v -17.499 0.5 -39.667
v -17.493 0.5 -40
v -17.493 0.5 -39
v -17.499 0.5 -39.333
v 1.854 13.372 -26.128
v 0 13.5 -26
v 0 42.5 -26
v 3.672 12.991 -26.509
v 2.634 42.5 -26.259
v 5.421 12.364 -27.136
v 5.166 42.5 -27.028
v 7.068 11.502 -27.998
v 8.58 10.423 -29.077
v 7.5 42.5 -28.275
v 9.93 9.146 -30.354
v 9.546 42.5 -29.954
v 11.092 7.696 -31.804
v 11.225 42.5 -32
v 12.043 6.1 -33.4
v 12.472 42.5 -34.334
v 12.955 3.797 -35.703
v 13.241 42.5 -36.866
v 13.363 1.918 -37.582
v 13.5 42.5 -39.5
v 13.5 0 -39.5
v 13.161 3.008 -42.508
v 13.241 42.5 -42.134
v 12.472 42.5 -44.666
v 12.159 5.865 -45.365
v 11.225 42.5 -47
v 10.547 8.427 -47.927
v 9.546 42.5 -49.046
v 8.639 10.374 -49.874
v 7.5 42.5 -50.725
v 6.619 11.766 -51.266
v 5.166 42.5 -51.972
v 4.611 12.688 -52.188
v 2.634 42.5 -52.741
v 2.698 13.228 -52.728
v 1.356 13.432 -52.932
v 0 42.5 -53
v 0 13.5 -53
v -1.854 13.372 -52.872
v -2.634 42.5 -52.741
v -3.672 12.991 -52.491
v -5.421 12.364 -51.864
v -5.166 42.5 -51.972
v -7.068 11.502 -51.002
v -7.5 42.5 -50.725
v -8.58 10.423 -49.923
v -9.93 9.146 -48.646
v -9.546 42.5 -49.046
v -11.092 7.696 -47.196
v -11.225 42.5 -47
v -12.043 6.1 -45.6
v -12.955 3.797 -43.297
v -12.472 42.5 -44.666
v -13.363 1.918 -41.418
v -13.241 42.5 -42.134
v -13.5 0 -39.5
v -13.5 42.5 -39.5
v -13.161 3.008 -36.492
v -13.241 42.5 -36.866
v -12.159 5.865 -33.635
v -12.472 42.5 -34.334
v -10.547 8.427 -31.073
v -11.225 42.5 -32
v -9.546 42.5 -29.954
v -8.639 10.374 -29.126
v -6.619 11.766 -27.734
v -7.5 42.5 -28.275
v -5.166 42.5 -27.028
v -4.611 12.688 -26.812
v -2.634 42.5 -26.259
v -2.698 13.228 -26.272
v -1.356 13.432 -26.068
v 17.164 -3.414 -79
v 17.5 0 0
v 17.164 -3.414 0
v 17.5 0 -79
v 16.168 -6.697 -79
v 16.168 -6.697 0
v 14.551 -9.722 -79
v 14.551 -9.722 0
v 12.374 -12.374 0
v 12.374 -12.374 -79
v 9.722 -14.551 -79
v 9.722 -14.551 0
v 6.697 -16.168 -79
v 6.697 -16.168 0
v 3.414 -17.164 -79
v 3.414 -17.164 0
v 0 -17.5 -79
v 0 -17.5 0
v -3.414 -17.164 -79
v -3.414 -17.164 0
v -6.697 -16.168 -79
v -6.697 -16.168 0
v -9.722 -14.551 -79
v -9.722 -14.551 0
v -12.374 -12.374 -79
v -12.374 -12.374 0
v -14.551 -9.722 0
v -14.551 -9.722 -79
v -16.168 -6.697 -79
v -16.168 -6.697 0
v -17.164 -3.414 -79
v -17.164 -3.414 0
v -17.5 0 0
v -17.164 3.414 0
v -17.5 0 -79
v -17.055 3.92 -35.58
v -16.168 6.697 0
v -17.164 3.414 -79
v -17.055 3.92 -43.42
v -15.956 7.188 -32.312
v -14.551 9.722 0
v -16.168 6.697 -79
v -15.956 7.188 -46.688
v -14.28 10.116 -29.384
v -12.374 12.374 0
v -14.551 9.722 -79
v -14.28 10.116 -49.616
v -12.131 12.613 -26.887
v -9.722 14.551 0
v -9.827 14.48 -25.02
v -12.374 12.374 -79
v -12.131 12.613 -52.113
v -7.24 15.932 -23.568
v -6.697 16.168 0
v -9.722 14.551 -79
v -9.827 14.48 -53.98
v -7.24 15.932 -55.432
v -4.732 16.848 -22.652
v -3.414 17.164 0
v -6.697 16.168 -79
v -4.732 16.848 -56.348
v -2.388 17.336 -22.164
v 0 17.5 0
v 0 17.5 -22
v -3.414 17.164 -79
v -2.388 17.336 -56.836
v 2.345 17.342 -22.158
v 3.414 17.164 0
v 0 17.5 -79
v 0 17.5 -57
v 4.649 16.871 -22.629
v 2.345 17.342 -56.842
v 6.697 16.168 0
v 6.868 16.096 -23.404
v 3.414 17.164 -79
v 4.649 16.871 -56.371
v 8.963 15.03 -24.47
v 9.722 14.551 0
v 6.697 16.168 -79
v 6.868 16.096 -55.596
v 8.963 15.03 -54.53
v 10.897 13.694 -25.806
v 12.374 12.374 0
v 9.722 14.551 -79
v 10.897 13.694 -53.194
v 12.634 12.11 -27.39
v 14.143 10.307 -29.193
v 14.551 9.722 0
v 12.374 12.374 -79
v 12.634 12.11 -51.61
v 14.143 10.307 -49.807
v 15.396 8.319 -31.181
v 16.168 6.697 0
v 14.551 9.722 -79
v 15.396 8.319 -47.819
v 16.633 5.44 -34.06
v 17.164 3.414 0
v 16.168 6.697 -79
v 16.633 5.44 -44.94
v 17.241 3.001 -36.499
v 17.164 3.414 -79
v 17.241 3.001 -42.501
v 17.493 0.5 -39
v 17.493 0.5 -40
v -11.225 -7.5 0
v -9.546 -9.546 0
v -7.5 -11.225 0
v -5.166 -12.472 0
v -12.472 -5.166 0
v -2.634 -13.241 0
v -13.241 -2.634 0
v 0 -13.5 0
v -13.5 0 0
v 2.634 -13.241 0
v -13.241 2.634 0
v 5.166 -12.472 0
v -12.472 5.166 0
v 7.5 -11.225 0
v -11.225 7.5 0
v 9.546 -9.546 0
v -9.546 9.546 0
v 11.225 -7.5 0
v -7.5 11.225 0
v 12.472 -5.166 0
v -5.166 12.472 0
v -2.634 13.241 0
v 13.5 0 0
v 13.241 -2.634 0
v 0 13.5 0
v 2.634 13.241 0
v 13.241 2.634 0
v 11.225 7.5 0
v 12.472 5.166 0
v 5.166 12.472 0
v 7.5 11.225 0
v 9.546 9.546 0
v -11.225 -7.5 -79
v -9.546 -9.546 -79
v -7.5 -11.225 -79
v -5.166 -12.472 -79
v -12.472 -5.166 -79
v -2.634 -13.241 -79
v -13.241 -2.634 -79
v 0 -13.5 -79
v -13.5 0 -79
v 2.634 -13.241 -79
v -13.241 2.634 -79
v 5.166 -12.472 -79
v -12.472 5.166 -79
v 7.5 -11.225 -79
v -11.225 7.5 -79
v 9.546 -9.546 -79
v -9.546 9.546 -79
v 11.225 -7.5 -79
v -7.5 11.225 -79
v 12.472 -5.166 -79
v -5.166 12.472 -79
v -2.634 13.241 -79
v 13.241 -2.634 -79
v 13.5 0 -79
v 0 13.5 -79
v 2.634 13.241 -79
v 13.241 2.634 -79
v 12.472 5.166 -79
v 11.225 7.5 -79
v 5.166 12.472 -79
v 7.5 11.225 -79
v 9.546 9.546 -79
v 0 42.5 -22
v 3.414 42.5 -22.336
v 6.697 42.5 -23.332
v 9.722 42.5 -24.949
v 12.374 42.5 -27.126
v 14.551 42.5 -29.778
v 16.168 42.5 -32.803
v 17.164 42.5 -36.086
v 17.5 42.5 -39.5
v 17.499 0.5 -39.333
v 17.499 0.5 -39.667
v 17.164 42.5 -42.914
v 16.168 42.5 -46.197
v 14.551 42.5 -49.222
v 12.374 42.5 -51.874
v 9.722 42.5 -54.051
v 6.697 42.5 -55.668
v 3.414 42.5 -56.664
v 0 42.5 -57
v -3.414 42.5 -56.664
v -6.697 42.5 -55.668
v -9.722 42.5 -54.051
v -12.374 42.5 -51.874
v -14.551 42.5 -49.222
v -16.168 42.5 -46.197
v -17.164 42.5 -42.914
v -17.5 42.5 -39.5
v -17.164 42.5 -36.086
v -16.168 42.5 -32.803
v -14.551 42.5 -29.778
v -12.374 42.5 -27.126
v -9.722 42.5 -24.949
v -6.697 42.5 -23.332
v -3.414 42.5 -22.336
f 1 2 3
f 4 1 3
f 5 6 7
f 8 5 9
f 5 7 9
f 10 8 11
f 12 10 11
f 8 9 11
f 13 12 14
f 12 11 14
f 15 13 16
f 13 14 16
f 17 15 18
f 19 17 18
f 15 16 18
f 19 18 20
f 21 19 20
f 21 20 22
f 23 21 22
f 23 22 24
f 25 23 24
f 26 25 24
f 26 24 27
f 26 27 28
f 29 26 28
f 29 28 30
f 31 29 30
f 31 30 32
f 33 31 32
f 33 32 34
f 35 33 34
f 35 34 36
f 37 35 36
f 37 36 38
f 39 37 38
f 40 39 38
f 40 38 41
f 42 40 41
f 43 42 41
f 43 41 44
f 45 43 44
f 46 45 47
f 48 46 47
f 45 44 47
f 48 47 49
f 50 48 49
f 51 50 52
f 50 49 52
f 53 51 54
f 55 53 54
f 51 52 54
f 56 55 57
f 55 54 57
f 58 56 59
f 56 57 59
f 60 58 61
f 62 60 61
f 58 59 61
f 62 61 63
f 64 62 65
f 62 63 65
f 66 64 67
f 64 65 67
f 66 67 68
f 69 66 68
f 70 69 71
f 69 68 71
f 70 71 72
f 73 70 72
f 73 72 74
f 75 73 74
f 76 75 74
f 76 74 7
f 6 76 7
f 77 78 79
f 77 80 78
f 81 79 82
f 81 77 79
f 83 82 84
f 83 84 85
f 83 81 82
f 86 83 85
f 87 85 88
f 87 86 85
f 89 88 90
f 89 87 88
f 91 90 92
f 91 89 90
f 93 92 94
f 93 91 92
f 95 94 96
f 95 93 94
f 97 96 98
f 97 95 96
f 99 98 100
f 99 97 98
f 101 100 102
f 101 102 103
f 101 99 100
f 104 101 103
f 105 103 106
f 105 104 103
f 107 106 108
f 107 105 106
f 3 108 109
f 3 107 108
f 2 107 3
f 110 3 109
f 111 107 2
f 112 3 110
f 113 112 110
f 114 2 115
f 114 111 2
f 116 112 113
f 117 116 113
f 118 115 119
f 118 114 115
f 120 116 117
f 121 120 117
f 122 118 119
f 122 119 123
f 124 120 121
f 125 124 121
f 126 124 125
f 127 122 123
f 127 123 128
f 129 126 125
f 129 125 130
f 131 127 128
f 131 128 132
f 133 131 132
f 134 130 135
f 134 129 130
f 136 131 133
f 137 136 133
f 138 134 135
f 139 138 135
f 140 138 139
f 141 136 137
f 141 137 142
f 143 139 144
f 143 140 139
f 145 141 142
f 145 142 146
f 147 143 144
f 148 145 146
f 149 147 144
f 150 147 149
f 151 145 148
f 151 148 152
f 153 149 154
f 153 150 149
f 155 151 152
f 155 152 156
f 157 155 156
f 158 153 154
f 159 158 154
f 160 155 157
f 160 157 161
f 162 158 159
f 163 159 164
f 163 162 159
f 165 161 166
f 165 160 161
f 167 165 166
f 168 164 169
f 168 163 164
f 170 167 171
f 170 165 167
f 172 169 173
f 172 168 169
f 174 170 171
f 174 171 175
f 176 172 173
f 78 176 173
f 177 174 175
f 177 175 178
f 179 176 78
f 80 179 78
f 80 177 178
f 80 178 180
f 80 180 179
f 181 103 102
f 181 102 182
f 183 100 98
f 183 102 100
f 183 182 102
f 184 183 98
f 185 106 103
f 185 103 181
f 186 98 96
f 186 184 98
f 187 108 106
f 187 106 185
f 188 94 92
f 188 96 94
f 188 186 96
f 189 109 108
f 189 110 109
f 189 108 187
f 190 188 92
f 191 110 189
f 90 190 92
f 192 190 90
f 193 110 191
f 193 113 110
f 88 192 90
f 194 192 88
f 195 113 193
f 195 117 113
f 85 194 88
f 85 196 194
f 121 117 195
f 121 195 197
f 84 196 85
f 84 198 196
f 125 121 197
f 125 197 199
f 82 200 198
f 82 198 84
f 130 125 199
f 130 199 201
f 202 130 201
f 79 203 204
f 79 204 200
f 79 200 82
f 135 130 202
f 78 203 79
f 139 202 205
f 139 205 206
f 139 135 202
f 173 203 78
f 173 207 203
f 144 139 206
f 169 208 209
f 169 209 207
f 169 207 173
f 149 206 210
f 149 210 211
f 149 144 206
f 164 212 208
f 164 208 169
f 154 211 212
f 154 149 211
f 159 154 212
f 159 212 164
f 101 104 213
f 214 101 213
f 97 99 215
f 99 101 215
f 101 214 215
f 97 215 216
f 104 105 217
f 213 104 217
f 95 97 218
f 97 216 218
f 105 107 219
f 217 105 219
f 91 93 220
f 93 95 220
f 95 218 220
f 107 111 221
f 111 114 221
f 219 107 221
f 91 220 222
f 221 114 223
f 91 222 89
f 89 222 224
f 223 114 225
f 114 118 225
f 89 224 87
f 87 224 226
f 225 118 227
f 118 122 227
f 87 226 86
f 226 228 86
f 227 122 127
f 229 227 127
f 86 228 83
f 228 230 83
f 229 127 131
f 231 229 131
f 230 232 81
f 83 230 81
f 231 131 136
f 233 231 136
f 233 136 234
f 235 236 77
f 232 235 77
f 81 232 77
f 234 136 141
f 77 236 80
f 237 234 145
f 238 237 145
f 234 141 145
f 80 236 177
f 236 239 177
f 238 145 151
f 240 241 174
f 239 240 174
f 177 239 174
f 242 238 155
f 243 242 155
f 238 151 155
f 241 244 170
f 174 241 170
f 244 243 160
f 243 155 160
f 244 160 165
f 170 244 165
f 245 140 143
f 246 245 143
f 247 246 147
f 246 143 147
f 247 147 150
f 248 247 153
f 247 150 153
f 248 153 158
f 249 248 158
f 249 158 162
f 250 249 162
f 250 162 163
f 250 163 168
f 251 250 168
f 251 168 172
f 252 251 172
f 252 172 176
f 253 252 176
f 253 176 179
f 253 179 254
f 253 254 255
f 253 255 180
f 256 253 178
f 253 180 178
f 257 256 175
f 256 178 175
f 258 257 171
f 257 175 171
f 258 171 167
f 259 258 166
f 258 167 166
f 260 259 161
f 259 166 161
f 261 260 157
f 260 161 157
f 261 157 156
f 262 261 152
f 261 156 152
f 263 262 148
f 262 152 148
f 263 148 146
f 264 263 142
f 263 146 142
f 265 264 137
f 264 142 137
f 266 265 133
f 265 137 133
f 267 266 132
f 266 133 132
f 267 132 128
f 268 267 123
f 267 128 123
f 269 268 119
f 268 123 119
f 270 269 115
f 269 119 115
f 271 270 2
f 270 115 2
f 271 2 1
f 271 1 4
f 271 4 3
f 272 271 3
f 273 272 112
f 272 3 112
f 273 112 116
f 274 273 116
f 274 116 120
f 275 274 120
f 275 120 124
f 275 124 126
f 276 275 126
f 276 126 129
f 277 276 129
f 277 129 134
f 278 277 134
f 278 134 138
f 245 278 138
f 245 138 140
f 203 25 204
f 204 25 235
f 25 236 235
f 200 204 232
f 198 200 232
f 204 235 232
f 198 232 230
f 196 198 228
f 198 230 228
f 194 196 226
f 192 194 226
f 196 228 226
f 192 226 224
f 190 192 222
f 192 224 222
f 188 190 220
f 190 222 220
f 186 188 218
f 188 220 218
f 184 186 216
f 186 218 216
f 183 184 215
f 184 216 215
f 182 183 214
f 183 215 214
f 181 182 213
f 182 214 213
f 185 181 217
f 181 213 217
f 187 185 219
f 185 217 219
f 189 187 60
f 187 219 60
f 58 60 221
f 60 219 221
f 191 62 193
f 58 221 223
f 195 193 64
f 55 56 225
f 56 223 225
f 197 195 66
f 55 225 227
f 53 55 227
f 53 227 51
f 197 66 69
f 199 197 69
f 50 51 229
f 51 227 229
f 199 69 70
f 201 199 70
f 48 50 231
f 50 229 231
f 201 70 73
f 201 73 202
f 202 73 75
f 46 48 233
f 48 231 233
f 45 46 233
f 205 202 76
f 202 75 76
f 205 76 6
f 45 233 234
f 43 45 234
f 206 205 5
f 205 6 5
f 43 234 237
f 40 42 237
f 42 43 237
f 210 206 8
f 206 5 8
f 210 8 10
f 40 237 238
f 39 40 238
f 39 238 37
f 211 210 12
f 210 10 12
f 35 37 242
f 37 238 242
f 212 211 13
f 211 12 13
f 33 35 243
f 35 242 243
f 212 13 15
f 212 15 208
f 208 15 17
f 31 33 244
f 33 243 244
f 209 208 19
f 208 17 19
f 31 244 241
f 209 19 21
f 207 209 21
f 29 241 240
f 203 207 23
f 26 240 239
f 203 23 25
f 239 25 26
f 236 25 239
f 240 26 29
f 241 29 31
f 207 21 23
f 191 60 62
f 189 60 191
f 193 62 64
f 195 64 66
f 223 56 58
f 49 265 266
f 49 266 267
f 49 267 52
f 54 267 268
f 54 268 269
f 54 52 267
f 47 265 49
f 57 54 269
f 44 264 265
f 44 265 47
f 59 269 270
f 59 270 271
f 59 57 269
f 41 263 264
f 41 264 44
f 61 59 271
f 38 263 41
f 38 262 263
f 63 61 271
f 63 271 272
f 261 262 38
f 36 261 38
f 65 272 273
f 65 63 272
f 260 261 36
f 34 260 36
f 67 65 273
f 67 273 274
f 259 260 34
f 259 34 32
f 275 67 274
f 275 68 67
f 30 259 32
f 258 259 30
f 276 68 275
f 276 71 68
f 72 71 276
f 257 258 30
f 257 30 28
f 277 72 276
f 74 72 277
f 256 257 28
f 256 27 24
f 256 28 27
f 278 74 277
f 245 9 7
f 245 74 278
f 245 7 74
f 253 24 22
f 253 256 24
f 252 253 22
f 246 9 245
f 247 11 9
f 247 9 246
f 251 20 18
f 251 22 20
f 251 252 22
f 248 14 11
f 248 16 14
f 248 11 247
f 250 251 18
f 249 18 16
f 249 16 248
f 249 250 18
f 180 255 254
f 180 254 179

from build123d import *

# Parameters (mm, degrees)
SKETCH1_R                = 17.5
SKETCH1_R_2              = 13.5
BOSS_EXTRUDE2_DEPTH      = 25
BOSS_EXTRUDE2_DEPTH_BACK = 17
SKETCH2_R                = 17.5
SKETCH3_R                = 13.5
CUT_EXTRUDE1_DEPTH       = 92.39748364
CUT_EXTRUDE2_REACH       = 102.734
CUT_EXTRUDE2_END_RADIUS  = 13.5
SKETCH4_R                = 13.5


with BuildPart() as part:
    # Sweep1: sweep along a curve in space
    with BuildLine() as sweep1_path:
        Line((0, 0, 0), (0, 0, -79))
    # Sketch1 → Sweep1 (sweep)
    with BuildSketch(Plane.XY):
        Circle(SKETCH1_R)
        Circle(SKETCH1_R_2, mode=Mode.SUBTRACT)
    sweep(path=sweep1_path.line)

    # Sketch2 → Boss-Extrude2 (add, two sides: drawn at the far end of the back side and taken through both)
    with BuildSketch(Plane(origin=(0, 17.5, 0), x_dir=(1, 0, 0), z_dir=(0, 1, 0)).offset(-BOSS_EXTRUDE2_DEPTH_BACK)):
        with Locations(Location((0, 39.5, 0), (0, 0, 270))):
            Circle(SKETCH2_R)
    extrude(amount=BOSS_EXTRUDE2_DEPTH + BOSS_EXTRUDE2_DEPTH_BACK)

    # Sketch3 → Cut-Extrude1 (cut, through all)
    with BuildSketch(Plane.XY):
        Circle(SKETCH3_R)
    extrude(amount=-CUT_EXTRUDE1_DEPTH, mode=Mode.SUBTRACT)

    # Cut-Extrude2: up to this cylinder (the profile starts outside it)
    cut_extrude2_end = Plane(origin=(0, 0, -39.5), z_dir=(0, 0, -1)) * Cylinder(CUT_EXTRUDE2_END_RADIUS, 233.468, mode=Mode.PRIVATE)
    # Sketch4 → Cut-Extrude2 (cut, up to the surface)
    with BuildSketch(Plane(origin=(0, 42.5, 0), x_dir=(1, 0, 0), z_dir=(0, 1, 0)), mode=Mode.PRIVATE) as cut_extrude2_sk1:
        with Locations(Location((0, 39.5, 0), (0, 0, 270))):
            Circle(SKETCH4_R)
    cut_extrude2_tool1 = extrude(cut_extrude2_sk1.sketch, amount=-CUT_EXTRUDE2_REACH, mode=Mode.PRIVATE) - cut_extrude2_end
    add(cut_extrude2_tool1.solids().sort_by_distance((0, 42.5, -39.5))[0], mode=Mode.SUBTRACT)


solid = part.part
